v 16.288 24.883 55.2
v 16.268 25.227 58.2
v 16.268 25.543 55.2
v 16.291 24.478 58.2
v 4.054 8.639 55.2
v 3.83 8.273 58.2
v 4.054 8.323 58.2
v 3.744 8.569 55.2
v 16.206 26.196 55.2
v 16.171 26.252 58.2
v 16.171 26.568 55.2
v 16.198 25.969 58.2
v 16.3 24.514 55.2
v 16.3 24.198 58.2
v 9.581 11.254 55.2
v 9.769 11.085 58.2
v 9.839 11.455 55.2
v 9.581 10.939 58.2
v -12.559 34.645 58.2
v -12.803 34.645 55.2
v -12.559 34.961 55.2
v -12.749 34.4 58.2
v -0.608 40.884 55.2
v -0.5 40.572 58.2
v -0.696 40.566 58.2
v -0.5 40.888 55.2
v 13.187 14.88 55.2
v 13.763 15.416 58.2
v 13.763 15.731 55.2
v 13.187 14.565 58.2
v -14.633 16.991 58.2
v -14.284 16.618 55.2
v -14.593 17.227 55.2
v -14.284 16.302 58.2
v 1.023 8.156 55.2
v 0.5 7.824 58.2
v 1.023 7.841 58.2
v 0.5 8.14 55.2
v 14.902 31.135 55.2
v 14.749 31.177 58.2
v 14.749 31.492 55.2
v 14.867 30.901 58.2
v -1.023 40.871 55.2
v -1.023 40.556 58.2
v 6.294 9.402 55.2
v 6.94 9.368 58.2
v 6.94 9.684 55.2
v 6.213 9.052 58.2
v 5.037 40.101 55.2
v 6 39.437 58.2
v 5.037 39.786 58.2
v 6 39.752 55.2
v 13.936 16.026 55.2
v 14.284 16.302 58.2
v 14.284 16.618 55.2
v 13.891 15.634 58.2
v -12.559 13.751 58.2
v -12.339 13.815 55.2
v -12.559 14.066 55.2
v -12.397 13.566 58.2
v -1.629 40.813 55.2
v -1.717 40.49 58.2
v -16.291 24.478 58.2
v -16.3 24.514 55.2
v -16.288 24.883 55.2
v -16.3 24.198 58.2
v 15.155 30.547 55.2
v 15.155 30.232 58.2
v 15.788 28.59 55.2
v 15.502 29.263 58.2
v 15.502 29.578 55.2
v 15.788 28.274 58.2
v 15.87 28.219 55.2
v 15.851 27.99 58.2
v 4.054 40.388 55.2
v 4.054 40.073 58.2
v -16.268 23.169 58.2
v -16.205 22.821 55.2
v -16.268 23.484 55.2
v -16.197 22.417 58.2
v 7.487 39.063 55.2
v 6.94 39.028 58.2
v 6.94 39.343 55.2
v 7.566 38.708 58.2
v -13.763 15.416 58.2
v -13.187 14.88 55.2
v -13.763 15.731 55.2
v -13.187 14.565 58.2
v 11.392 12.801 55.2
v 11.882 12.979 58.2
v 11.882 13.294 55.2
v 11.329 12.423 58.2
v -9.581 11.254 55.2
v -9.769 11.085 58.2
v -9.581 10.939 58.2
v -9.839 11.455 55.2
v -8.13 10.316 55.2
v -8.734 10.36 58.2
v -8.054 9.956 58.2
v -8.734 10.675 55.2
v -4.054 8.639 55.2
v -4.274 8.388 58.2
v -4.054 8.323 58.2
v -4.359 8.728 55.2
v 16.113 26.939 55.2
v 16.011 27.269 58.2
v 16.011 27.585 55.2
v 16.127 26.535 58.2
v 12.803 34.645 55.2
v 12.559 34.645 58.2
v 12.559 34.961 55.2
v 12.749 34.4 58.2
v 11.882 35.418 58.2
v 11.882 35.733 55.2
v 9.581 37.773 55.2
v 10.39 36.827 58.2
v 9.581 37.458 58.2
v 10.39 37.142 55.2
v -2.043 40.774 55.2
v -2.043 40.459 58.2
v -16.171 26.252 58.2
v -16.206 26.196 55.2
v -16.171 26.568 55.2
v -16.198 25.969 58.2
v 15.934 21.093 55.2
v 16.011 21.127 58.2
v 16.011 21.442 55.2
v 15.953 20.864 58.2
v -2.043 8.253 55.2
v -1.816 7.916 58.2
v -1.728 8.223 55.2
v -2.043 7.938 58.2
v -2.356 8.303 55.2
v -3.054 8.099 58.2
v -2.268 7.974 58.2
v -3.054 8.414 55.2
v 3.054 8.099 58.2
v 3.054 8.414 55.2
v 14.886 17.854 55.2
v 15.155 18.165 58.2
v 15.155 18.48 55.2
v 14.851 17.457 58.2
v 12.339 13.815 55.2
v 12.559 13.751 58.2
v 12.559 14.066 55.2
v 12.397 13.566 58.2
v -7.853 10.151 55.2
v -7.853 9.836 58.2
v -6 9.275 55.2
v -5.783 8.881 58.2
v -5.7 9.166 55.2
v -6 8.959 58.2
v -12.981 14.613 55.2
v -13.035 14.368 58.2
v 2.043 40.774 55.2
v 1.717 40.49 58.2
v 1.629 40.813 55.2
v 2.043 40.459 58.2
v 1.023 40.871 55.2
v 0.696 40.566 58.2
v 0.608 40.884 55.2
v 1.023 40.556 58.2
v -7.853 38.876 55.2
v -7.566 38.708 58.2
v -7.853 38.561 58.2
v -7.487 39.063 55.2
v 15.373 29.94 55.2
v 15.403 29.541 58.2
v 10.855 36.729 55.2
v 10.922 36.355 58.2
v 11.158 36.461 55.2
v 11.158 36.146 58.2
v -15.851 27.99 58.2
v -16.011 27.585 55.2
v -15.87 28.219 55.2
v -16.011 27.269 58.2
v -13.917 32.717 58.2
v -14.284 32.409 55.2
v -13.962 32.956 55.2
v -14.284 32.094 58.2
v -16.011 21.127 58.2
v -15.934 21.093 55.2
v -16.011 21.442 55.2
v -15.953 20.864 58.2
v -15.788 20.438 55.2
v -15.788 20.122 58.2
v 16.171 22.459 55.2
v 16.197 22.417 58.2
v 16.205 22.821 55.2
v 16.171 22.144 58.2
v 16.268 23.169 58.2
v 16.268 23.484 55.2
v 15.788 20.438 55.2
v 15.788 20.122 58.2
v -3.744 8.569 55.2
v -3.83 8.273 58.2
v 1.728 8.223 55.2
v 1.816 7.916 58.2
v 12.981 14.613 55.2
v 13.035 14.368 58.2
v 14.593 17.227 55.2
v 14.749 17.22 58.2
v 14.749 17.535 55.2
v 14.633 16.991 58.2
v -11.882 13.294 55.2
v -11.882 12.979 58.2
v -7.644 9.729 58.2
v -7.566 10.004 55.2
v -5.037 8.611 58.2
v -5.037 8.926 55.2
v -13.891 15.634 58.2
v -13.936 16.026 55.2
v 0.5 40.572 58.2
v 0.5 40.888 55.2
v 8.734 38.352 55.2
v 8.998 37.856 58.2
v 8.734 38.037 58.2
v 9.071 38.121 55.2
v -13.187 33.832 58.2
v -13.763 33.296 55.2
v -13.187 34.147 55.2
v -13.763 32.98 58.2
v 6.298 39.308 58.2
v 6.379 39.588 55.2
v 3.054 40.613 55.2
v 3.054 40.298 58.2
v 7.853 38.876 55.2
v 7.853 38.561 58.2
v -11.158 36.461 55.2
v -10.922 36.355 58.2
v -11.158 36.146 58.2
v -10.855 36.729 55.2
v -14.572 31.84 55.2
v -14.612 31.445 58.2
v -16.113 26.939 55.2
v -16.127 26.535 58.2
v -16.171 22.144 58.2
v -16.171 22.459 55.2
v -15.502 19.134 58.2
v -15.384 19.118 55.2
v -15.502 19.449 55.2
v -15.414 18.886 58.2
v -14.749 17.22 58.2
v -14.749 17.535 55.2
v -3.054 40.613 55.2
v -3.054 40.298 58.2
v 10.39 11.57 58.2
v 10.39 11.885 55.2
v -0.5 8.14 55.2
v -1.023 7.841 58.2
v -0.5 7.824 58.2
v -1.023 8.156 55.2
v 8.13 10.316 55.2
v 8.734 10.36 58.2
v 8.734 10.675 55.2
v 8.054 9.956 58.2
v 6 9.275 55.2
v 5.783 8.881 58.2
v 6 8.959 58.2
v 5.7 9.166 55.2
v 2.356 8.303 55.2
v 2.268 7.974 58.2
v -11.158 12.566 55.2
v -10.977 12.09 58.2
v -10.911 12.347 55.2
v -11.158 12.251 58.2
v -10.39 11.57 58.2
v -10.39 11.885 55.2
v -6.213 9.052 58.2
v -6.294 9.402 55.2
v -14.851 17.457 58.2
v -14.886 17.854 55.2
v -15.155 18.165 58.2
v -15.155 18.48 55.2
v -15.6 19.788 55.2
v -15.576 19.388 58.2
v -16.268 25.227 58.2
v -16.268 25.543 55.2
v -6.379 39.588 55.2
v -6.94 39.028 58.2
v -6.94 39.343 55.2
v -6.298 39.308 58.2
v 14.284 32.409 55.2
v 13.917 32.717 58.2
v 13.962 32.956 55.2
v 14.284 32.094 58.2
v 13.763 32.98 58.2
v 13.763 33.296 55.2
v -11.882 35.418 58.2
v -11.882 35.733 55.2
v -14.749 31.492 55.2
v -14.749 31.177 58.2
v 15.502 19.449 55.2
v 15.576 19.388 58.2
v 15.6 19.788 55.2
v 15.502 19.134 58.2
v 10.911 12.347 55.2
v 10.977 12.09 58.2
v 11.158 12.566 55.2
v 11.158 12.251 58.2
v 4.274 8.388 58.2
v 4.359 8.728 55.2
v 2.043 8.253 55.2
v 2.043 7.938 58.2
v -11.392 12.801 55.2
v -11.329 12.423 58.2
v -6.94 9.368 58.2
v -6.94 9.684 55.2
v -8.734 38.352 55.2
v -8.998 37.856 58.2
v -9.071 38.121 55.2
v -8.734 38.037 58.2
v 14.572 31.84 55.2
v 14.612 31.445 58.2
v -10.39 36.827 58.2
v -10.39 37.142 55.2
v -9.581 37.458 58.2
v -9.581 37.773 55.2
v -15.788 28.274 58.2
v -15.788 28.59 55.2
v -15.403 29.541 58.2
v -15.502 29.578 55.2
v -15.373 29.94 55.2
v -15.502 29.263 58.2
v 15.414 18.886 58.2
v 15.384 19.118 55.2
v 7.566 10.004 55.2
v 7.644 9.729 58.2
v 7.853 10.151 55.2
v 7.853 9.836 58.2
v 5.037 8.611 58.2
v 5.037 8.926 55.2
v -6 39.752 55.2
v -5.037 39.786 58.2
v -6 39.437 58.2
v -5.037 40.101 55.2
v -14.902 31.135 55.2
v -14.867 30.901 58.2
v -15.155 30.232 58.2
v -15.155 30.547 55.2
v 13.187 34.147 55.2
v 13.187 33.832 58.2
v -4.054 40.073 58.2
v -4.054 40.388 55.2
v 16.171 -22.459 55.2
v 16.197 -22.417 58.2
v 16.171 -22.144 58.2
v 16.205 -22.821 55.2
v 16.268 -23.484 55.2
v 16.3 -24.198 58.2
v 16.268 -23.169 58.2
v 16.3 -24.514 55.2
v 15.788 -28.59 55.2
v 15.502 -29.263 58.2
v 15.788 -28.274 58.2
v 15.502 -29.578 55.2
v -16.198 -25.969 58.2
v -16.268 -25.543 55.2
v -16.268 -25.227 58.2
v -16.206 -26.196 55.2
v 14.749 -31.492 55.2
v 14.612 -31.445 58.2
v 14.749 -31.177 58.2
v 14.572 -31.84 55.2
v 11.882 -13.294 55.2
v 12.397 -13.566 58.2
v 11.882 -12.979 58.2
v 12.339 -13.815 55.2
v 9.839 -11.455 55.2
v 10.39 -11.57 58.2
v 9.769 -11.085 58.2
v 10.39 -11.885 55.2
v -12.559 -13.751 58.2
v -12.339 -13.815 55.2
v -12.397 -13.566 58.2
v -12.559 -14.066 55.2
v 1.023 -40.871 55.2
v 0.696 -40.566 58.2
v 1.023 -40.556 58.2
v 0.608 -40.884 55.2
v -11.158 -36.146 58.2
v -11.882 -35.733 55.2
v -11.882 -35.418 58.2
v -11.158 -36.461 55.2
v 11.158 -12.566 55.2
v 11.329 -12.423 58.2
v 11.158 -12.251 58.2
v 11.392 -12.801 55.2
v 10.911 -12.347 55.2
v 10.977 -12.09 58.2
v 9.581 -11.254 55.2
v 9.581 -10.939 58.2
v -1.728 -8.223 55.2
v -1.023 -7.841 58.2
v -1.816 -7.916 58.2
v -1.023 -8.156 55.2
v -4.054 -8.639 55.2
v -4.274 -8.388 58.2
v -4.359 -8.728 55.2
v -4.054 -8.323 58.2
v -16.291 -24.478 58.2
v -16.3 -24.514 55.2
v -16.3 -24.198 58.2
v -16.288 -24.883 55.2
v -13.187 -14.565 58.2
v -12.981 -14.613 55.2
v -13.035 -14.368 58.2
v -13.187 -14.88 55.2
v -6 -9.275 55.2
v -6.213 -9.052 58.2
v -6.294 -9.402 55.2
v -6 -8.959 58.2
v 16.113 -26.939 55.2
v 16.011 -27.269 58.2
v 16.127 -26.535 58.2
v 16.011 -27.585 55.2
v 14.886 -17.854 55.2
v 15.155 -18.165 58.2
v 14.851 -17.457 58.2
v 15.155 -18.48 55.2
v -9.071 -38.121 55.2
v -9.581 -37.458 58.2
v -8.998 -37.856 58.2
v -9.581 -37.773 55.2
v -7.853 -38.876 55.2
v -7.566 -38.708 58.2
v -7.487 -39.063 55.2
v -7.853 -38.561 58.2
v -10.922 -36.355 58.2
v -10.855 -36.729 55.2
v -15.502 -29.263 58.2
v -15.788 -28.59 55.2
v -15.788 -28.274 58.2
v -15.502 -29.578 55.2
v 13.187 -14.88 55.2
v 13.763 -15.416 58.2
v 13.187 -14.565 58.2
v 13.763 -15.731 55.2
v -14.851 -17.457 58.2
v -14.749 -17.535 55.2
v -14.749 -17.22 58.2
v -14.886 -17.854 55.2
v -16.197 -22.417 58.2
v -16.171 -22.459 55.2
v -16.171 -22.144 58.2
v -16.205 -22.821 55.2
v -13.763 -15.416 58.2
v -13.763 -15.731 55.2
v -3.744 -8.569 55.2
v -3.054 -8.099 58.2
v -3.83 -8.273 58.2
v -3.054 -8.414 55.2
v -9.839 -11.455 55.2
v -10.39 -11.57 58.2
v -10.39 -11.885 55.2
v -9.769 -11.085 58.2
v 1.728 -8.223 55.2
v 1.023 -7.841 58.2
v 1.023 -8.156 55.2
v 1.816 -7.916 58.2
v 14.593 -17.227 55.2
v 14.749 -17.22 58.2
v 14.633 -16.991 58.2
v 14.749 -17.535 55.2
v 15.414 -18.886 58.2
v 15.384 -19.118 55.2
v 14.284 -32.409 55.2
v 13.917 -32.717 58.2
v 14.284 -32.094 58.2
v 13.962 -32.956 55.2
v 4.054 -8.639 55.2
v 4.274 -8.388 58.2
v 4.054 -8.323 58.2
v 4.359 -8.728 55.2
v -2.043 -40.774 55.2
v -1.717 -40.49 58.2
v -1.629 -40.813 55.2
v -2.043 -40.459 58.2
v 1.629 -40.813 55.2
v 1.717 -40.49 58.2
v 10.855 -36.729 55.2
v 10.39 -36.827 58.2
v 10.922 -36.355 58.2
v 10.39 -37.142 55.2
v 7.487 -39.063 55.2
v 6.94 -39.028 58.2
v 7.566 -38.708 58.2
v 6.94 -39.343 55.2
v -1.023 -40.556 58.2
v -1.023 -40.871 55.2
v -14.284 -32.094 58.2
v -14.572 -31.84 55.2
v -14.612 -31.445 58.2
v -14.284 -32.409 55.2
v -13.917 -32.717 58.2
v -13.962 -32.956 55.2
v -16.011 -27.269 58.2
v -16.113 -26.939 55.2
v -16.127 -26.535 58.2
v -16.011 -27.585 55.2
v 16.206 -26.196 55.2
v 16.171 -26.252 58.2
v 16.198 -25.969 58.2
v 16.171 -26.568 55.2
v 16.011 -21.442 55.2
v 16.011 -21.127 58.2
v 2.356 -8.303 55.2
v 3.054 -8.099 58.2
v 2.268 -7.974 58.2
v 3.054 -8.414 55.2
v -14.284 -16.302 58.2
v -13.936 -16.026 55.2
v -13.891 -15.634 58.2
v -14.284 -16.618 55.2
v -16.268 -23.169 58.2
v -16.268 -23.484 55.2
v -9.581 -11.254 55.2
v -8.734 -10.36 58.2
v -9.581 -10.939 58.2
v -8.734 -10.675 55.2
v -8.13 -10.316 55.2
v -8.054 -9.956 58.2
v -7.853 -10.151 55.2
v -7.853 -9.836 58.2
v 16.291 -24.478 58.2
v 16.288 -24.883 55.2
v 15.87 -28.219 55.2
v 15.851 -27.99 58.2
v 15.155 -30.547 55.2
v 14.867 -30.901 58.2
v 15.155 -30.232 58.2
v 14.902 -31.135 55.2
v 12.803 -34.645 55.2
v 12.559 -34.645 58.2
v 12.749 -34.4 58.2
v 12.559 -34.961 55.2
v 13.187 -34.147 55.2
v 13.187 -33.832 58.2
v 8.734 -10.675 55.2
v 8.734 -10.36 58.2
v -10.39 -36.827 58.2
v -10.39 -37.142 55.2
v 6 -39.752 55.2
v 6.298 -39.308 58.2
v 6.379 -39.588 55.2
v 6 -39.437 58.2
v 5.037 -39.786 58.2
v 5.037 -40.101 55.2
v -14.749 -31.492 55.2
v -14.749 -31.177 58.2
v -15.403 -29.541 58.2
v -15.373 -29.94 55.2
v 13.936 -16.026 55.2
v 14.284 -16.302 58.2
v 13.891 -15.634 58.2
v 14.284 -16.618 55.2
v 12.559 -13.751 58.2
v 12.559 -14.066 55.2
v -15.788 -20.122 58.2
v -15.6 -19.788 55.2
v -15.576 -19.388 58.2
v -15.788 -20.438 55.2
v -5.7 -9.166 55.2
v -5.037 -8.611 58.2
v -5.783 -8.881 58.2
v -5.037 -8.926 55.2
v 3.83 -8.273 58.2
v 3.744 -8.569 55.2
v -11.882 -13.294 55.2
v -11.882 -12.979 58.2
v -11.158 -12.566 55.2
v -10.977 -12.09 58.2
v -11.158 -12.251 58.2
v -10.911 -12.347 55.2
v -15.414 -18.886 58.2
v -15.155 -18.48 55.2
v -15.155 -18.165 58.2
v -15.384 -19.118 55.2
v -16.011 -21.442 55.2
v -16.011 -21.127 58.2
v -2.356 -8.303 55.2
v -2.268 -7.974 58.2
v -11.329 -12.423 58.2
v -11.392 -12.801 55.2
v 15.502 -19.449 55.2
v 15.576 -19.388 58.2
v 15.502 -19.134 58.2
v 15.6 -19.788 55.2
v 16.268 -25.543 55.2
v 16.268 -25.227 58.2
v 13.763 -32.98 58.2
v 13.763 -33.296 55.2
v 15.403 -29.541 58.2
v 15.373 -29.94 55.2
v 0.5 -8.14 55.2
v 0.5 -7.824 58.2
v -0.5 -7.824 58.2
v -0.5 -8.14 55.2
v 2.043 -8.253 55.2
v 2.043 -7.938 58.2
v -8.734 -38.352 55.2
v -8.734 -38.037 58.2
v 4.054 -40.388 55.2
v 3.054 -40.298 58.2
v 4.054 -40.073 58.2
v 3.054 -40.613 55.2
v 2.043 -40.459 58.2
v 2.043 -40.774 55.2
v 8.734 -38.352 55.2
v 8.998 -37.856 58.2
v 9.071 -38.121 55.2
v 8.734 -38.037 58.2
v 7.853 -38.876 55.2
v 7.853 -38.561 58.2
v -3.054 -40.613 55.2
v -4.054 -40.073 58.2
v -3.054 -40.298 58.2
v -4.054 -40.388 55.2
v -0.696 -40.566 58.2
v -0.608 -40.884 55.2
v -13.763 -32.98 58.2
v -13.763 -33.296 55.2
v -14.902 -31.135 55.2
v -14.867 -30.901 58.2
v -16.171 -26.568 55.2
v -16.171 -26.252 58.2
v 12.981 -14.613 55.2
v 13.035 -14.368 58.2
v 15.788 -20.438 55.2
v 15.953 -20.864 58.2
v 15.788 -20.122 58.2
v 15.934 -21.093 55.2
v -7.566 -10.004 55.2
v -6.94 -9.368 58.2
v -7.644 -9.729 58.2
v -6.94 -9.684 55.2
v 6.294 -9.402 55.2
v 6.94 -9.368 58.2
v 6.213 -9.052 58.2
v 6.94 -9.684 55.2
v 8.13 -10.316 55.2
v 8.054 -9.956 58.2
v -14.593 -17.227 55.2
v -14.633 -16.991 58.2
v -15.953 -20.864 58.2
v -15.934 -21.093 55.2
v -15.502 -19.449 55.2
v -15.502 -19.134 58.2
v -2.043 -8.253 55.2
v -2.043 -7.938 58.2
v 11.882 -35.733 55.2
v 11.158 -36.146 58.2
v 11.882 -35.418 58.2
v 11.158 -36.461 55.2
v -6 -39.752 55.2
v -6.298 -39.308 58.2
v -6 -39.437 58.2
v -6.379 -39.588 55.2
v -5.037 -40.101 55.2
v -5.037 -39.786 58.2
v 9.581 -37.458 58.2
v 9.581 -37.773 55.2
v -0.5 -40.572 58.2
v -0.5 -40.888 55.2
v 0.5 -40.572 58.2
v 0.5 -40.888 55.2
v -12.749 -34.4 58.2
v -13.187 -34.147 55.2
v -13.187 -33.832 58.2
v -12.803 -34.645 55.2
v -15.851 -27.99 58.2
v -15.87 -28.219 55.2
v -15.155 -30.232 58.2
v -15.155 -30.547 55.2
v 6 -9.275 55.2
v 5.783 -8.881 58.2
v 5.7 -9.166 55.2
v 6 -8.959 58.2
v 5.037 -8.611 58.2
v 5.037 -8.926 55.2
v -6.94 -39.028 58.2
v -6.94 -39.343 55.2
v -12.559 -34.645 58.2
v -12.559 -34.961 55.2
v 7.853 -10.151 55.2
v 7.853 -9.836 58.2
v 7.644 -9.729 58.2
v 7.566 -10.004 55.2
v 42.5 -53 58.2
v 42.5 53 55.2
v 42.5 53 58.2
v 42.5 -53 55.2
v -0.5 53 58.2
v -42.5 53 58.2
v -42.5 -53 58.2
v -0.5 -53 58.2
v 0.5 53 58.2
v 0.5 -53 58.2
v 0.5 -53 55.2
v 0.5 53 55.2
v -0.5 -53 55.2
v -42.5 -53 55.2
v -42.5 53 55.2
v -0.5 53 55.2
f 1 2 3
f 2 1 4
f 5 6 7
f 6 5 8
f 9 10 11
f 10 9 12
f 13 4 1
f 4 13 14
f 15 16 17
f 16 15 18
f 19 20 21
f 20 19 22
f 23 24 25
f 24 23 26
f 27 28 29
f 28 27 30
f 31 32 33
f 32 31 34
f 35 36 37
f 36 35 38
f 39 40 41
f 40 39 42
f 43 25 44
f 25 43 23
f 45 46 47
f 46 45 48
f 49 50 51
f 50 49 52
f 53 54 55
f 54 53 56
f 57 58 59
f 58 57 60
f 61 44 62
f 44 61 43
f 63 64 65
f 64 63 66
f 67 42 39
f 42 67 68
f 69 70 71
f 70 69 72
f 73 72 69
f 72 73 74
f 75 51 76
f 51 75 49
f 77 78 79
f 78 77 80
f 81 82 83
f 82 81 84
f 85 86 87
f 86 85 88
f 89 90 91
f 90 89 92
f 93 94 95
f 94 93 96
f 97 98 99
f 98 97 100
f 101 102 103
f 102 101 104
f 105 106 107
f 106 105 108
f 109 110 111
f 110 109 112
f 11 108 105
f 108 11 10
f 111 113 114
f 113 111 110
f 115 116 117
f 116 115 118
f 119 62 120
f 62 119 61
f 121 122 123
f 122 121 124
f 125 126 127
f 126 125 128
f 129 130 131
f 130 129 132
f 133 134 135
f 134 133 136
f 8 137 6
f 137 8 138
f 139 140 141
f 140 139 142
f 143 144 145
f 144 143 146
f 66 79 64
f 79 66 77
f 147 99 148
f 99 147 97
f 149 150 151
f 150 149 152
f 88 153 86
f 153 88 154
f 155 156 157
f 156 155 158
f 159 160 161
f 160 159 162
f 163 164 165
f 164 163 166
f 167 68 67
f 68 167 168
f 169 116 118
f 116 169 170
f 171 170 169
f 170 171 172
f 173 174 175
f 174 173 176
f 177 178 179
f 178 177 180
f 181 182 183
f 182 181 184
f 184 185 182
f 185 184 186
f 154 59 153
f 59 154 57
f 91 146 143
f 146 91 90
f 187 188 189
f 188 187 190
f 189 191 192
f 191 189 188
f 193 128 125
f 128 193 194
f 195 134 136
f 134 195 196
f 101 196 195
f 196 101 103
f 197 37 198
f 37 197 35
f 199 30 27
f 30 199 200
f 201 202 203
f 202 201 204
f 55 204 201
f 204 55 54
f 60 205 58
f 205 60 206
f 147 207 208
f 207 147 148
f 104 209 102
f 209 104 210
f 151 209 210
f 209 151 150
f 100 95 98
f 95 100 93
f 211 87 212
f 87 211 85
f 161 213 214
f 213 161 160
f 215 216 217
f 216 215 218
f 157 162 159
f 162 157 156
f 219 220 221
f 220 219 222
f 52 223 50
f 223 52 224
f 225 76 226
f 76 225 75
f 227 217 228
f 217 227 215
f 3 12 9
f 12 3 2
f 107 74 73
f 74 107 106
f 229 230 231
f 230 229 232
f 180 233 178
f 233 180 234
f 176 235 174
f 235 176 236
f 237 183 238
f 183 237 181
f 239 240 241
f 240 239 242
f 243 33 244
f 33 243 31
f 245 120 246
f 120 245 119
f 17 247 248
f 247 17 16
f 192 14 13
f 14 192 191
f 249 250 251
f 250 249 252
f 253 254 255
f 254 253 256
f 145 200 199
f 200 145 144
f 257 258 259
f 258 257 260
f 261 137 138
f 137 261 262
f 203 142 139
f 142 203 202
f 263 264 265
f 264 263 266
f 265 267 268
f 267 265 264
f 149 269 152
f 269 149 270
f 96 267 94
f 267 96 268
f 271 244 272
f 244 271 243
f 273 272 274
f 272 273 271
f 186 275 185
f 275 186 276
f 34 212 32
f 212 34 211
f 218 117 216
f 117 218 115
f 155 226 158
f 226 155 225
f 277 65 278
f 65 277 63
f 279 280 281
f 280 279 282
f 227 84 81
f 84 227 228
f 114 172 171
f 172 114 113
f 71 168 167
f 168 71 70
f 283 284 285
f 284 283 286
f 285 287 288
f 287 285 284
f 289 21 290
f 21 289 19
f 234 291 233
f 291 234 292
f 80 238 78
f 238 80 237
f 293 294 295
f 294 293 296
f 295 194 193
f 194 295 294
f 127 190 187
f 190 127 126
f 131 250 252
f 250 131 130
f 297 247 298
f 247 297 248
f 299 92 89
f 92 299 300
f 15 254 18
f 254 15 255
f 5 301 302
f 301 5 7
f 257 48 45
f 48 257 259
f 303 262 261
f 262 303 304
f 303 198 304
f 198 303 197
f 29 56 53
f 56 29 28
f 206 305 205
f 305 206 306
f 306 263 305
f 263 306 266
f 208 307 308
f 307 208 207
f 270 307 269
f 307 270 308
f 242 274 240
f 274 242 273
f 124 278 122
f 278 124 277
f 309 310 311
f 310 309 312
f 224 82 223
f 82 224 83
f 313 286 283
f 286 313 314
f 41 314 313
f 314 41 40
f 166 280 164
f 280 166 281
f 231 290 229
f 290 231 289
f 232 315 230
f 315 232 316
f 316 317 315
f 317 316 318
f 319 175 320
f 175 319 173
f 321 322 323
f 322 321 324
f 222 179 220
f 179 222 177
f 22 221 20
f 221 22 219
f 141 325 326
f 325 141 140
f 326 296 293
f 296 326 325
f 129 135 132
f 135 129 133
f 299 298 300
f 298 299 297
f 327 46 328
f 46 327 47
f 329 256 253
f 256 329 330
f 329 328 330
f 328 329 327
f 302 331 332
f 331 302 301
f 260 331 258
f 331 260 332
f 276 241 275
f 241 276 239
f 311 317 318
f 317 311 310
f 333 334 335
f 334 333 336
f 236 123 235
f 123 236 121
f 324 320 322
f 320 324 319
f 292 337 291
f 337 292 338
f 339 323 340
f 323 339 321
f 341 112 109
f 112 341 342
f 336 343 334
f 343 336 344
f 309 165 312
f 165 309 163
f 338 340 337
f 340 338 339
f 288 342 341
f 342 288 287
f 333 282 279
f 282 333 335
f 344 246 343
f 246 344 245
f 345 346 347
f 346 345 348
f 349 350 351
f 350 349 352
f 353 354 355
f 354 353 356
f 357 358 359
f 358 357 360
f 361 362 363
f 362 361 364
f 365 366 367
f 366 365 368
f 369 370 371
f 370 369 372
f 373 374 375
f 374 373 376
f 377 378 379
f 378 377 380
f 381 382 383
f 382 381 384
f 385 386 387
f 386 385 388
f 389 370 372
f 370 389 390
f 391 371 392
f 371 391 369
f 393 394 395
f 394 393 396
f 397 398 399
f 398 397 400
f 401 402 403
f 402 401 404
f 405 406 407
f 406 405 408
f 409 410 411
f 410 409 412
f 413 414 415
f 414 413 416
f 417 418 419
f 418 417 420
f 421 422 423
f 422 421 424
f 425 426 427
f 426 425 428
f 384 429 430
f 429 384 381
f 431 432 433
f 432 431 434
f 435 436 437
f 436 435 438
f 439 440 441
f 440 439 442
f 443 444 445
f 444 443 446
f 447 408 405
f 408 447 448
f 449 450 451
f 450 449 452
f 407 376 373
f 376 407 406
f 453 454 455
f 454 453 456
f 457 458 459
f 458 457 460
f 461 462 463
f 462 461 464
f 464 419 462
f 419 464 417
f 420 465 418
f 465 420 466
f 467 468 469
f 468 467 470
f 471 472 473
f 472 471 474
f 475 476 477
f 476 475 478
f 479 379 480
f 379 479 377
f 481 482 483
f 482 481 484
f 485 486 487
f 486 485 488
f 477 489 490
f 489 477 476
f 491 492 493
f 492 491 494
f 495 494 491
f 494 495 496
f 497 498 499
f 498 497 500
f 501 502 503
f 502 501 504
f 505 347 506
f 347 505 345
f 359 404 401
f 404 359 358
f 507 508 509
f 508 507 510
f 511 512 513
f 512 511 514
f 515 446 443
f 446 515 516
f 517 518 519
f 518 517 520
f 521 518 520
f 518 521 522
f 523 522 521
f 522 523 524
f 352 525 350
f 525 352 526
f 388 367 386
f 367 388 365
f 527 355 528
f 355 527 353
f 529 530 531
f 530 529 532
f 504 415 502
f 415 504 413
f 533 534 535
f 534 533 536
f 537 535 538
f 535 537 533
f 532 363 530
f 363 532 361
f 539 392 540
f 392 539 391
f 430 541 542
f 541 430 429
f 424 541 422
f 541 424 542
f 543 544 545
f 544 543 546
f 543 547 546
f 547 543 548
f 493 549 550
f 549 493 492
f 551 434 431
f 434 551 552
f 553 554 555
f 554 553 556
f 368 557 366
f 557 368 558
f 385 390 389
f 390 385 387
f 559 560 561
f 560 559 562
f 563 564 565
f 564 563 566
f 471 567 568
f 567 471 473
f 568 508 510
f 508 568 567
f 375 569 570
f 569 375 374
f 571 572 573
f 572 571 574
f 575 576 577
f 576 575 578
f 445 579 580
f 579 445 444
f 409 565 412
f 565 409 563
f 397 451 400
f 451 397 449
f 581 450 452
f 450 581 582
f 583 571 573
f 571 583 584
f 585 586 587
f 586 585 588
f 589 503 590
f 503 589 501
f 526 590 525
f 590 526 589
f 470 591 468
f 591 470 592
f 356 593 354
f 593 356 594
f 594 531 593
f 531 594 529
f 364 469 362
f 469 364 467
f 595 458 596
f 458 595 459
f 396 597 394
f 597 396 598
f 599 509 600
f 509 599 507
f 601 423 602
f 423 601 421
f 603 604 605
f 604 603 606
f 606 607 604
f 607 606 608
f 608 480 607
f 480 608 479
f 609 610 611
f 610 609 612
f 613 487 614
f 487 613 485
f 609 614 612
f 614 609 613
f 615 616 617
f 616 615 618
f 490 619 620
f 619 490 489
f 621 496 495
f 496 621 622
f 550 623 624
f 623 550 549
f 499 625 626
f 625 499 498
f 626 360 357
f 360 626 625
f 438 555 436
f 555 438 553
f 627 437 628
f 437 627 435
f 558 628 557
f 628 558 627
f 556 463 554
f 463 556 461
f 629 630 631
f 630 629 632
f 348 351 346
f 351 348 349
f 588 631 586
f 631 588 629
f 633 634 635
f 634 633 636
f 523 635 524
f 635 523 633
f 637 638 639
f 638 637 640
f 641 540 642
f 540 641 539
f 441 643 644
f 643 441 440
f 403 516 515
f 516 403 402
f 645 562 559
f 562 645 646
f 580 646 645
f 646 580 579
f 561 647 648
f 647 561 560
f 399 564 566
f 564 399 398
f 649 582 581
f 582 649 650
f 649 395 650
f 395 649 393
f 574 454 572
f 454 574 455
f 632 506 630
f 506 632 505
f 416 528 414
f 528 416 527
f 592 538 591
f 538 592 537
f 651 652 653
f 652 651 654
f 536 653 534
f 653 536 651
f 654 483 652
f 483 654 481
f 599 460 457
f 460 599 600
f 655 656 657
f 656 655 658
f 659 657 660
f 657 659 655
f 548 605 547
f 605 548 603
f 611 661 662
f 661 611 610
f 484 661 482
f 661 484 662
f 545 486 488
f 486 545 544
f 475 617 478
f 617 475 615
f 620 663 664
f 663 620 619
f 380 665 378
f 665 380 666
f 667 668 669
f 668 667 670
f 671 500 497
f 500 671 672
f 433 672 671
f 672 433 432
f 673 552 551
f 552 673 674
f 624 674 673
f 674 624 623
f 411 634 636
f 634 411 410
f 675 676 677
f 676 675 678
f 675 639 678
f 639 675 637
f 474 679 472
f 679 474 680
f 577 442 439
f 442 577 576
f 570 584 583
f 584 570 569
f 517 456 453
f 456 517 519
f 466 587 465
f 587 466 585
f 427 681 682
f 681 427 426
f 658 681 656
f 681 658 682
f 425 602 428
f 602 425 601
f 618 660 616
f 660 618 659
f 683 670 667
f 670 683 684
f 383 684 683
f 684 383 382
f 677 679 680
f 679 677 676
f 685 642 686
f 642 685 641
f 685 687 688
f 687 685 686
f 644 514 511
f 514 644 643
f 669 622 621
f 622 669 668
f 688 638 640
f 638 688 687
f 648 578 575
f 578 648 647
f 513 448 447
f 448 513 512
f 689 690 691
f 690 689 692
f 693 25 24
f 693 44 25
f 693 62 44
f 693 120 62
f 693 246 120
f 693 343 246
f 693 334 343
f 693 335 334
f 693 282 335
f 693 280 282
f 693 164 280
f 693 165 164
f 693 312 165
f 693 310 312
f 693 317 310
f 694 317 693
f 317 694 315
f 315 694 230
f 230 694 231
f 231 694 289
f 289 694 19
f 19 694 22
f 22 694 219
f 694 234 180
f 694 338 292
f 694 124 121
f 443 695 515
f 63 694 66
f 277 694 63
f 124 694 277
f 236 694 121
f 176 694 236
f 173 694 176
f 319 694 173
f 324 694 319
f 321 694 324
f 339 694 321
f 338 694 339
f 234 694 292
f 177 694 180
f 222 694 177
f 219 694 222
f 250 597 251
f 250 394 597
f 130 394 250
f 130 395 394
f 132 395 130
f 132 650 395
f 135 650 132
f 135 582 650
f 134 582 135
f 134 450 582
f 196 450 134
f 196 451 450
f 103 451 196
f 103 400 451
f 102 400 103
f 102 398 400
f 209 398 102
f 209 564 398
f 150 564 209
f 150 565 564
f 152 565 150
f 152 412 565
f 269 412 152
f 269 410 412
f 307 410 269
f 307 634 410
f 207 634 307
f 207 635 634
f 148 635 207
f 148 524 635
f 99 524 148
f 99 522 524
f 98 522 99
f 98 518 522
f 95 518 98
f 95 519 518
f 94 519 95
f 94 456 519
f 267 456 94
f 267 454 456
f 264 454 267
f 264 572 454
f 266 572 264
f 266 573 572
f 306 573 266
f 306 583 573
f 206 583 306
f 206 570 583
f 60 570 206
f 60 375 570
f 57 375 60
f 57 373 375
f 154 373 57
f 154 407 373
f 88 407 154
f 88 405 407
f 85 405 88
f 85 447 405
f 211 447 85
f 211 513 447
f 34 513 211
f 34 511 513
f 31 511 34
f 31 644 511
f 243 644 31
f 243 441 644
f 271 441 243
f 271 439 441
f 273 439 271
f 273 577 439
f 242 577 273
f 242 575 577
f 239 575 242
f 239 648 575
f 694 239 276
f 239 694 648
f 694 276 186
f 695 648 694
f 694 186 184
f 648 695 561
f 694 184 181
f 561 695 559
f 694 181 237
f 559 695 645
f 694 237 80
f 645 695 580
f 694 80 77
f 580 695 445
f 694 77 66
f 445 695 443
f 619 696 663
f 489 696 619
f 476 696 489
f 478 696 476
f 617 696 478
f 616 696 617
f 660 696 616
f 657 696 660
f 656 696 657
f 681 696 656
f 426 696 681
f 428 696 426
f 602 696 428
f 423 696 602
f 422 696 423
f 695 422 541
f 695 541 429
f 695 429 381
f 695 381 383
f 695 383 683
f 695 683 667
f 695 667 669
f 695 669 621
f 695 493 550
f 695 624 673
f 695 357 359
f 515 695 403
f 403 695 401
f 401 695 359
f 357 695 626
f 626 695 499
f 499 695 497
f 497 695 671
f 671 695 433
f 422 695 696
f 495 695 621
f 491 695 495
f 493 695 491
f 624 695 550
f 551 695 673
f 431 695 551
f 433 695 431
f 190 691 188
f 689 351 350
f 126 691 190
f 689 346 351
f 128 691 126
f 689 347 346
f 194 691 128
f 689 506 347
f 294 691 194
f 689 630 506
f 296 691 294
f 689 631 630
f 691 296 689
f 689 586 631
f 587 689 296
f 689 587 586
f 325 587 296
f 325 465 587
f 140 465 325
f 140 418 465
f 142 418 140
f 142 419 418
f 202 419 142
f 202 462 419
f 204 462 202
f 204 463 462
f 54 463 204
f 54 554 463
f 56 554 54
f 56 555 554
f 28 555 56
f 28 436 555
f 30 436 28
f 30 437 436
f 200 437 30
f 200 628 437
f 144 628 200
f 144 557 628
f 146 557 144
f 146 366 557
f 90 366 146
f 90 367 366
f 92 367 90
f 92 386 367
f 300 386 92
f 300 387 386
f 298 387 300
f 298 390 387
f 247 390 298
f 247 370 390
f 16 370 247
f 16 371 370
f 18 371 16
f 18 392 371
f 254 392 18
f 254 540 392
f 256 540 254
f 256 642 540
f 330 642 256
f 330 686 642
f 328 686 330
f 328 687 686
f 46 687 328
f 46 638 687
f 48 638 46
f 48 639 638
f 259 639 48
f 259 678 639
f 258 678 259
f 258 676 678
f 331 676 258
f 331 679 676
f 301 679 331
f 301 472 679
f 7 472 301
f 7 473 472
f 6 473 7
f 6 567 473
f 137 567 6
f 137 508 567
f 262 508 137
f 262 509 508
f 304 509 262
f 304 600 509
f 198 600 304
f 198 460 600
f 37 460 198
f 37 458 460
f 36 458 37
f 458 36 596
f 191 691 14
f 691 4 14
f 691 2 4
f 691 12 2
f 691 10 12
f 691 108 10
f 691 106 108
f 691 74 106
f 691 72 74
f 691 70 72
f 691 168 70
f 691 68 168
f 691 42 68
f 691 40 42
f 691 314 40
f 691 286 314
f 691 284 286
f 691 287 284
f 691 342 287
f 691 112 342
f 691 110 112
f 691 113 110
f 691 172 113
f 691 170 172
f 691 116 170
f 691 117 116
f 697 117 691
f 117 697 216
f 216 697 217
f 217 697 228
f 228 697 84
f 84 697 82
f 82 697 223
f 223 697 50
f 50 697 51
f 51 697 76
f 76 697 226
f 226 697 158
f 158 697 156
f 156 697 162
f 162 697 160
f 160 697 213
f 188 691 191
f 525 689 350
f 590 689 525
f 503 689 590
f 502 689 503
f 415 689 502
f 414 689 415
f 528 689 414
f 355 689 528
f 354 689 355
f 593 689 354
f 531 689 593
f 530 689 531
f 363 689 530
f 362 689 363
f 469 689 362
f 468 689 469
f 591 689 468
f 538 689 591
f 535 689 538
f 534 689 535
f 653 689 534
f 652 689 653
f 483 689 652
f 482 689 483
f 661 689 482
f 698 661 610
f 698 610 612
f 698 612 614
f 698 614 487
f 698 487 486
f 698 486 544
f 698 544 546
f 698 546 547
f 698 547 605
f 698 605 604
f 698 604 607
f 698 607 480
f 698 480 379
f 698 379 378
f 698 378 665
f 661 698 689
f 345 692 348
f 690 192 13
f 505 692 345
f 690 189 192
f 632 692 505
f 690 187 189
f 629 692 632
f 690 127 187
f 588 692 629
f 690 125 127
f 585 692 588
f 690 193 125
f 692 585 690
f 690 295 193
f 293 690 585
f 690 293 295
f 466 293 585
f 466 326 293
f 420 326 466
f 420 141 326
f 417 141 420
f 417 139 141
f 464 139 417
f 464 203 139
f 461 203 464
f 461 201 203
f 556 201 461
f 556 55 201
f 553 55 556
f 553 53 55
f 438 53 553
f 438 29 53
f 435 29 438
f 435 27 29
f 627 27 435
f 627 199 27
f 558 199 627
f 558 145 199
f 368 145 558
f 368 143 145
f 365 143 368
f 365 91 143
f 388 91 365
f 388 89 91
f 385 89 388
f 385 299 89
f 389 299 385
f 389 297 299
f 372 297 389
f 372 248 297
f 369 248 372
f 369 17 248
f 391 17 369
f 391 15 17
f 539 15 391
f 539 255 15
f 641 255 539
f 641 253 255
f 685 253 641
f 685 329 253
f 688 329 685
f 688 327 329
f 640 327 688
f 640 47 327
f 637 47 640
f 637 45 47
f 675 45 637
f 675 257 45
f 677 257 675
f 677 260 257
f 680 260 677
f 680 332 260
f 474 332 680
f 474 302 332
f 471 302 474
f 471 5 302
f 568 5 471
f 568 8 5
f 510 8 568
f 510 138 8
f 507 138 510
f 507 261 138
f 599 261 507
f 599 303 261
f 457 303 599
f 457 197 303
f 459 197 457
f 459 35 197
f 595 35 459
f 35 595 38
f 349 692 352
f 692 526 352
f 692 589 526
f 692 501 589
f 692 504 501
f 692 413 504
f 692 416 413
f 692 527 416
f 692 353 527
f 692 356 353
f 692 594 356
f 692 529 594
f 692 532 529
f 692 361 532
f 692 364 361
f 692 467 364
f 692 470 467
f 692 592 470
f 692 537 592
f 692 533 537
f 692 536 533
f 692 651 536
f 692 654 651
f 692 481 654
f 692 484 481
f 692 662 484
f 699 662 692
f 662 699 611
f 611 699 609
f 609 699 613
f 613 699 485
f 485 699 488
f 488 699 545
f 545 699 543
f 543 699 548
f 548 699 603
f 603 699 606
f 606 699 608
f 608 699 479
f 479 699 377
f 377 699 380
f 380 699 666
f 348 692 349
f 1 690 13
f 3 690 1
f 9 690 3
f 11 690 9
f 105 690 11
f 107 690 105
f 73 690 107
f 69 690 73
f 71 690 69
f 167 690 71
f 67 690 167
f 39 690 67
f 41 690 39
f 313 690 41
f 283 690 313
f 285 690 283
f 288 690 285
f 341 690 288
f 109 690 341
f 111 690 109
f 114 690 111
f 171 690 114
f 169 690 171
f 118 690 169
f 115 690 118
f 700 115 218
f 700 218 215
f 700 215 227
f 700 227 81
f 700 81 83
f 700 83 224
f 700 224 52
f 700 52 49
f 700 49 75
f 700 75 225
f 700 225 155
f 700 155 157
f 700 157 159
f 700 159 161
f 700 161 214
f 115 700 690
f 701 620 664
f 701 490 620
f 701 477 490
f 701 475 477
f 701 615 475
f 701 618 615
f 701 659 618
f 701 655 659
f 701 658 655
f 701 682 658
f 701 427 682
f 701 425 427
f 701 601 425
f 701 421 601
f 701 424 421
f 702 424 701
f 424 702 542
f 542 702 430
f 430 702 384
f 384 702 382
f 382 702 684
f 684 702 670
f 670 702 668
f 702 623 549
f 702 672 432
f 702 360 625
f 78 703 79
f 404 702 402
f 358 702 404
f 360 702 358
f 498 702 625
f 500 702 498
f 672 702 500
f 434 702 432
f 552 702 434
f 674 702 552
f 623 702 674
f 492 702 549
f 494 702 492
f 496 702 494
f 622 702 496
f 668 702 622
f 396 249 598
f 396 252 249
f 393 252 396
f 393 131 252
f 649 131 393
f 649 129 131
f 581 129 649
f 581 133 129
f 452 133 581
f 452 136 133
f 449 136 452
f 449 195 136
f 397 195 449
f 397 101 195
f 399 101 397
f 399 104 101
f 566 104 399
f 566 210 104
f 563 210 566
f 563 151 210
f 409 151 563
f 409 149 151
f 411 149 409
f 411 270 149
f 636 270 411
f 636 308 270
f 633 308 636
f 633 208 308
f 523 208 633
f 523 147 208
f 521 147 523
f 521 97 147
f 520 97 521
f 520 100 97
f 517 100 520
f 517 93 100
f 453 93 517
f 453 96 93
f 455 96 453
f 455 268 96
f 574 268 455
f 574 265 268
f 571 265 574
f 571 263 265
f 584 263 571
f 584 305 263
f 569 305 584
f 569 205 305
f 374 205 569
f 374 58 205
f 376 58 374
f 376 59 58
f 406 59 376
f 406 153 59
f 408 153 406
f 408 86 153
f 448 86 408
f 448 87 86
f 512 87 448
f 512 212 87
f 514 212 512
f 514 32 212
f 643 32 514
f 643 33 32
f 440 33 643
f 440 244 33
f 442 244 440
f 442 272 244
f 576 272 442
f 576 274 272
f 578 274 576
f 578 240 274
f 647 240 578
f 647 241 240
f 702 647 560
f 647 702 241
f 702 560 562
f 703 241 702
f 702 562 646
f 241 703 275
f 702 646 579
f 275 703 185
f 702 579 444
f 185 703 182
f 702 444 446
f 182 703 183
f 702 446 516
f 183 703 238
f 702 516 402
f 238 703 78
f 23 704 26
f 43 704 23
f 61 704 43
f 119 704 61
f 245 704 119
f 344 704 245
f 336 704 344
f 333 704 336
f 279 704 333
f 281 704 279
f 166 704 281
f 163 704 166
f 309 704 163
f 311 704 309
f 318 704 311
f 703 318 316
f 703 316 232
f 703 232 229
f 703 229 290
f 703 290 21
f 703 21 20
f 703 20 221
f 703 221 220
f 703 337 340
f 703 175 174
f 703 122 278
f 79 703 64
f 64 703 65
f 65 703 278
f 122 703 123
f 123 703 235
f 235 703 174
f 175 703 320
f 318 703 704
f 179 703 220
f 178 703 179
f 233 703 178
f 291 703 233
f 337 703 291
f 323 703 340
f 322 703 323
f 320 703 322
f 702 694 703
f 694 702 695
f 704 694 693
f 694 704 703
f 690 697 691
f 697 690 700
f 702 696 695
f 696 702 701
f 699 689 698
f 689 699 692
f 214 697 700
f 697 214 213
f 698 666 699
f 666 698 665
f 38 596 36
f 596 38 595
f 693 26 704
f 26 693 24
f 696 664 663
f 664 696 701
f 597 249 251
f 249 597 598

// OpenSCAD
$fn=100;
holder_width=1.5;

*holder_base();
holder_lid();

module holder_lid() {
difference() {
    translate([0,0,56.7]) cube([85, 106, 3], center=true);
    holder_base();
    translate([0,30,3]) rotate([6, 0,0])  translate([0,0,-20]) ep50();
    translate([0,-30,3]) rotate([-6, 0,0])  translate([0,0,-20]) ep50();
    cube([1,1000, 1000], center=true);
}
}

module holder_base() {
difference() {
      translate([0,0,27.5]) cube([85, 106, 55], center=true);
      translate([0,0,34]) cube([79, 100, 55], center=true);
    translate([0,-25,-0.1]) cylinder(r=2, h=5);
    hull() {
        translate([0,24,-0.1]) cylinder(r=2, h=5);
        translate([0,17,-0.1]) cylinder(r=2, h=5);
    }
    hull() {
        translate([-14.5,-4,-0.1]) cylinder(r=2, h=5);
        translate([-14.5,4,-0.1]) cylinder(r=2, h=5);
    }
}

difference() {
    union() {
        translate([0,30,3]) rotate([6, 0,0])  translate([0,0,30]) cylinder(r=14.8+holder_width,  h=35);
        translate([0,-30,3]) rotate([-6, 0,0])  translate([0,0,30]) cylinder(r=14.8+holder_width,  h=35);
        translate([0,43,30]) cube([8, 20, 50], center=true);
        translate([0,30,3]) rotate([6, 0,0]) intersection() { 
            translate([0,0,2]) cylinder(r=14.8+holder_width, h=35);
            hull() {
                translate([0,-50,30]) cube([25, 100, 1], center=true);
                translate([0,-50,0]) cube([4, 100, 1], center=true);
            }
        }
        translate([0,-43,30]) cube([8, 20, 50], center=true);
        translate([0,-30,3]) rotate([-6, 0,0]) intersection() { 
            translate([0,0,2]) cylinder(r=14.8+holder_width, h=35);
            hull() {
                translate([0,50,30]) cube([25, 100, 1], center=true);
                translate([0,50,0]) cube([4, 100, 1], center=true);
            }
        }
    }
    translate([0,30,3]) rotate([6, 0,0])  translate([0,0,-20]) ep50();
    translate([0,-30,3]) rotate([-6, 0,0])  translate([0,0,-20]) ep50();
}
}


module ep50() {
     translate([0,0,15]) cylinder(r=14.8, h=100);
     cylinder(r1=4, r2=14.8, h=15);
}
        


//translate([0,30,0]) rotate([6, 0,0])  cylinder(r=15, h=115);
//translate([0,-30,0]) rotate([-6, 0,0])  cylinder(r=15, h=115);
